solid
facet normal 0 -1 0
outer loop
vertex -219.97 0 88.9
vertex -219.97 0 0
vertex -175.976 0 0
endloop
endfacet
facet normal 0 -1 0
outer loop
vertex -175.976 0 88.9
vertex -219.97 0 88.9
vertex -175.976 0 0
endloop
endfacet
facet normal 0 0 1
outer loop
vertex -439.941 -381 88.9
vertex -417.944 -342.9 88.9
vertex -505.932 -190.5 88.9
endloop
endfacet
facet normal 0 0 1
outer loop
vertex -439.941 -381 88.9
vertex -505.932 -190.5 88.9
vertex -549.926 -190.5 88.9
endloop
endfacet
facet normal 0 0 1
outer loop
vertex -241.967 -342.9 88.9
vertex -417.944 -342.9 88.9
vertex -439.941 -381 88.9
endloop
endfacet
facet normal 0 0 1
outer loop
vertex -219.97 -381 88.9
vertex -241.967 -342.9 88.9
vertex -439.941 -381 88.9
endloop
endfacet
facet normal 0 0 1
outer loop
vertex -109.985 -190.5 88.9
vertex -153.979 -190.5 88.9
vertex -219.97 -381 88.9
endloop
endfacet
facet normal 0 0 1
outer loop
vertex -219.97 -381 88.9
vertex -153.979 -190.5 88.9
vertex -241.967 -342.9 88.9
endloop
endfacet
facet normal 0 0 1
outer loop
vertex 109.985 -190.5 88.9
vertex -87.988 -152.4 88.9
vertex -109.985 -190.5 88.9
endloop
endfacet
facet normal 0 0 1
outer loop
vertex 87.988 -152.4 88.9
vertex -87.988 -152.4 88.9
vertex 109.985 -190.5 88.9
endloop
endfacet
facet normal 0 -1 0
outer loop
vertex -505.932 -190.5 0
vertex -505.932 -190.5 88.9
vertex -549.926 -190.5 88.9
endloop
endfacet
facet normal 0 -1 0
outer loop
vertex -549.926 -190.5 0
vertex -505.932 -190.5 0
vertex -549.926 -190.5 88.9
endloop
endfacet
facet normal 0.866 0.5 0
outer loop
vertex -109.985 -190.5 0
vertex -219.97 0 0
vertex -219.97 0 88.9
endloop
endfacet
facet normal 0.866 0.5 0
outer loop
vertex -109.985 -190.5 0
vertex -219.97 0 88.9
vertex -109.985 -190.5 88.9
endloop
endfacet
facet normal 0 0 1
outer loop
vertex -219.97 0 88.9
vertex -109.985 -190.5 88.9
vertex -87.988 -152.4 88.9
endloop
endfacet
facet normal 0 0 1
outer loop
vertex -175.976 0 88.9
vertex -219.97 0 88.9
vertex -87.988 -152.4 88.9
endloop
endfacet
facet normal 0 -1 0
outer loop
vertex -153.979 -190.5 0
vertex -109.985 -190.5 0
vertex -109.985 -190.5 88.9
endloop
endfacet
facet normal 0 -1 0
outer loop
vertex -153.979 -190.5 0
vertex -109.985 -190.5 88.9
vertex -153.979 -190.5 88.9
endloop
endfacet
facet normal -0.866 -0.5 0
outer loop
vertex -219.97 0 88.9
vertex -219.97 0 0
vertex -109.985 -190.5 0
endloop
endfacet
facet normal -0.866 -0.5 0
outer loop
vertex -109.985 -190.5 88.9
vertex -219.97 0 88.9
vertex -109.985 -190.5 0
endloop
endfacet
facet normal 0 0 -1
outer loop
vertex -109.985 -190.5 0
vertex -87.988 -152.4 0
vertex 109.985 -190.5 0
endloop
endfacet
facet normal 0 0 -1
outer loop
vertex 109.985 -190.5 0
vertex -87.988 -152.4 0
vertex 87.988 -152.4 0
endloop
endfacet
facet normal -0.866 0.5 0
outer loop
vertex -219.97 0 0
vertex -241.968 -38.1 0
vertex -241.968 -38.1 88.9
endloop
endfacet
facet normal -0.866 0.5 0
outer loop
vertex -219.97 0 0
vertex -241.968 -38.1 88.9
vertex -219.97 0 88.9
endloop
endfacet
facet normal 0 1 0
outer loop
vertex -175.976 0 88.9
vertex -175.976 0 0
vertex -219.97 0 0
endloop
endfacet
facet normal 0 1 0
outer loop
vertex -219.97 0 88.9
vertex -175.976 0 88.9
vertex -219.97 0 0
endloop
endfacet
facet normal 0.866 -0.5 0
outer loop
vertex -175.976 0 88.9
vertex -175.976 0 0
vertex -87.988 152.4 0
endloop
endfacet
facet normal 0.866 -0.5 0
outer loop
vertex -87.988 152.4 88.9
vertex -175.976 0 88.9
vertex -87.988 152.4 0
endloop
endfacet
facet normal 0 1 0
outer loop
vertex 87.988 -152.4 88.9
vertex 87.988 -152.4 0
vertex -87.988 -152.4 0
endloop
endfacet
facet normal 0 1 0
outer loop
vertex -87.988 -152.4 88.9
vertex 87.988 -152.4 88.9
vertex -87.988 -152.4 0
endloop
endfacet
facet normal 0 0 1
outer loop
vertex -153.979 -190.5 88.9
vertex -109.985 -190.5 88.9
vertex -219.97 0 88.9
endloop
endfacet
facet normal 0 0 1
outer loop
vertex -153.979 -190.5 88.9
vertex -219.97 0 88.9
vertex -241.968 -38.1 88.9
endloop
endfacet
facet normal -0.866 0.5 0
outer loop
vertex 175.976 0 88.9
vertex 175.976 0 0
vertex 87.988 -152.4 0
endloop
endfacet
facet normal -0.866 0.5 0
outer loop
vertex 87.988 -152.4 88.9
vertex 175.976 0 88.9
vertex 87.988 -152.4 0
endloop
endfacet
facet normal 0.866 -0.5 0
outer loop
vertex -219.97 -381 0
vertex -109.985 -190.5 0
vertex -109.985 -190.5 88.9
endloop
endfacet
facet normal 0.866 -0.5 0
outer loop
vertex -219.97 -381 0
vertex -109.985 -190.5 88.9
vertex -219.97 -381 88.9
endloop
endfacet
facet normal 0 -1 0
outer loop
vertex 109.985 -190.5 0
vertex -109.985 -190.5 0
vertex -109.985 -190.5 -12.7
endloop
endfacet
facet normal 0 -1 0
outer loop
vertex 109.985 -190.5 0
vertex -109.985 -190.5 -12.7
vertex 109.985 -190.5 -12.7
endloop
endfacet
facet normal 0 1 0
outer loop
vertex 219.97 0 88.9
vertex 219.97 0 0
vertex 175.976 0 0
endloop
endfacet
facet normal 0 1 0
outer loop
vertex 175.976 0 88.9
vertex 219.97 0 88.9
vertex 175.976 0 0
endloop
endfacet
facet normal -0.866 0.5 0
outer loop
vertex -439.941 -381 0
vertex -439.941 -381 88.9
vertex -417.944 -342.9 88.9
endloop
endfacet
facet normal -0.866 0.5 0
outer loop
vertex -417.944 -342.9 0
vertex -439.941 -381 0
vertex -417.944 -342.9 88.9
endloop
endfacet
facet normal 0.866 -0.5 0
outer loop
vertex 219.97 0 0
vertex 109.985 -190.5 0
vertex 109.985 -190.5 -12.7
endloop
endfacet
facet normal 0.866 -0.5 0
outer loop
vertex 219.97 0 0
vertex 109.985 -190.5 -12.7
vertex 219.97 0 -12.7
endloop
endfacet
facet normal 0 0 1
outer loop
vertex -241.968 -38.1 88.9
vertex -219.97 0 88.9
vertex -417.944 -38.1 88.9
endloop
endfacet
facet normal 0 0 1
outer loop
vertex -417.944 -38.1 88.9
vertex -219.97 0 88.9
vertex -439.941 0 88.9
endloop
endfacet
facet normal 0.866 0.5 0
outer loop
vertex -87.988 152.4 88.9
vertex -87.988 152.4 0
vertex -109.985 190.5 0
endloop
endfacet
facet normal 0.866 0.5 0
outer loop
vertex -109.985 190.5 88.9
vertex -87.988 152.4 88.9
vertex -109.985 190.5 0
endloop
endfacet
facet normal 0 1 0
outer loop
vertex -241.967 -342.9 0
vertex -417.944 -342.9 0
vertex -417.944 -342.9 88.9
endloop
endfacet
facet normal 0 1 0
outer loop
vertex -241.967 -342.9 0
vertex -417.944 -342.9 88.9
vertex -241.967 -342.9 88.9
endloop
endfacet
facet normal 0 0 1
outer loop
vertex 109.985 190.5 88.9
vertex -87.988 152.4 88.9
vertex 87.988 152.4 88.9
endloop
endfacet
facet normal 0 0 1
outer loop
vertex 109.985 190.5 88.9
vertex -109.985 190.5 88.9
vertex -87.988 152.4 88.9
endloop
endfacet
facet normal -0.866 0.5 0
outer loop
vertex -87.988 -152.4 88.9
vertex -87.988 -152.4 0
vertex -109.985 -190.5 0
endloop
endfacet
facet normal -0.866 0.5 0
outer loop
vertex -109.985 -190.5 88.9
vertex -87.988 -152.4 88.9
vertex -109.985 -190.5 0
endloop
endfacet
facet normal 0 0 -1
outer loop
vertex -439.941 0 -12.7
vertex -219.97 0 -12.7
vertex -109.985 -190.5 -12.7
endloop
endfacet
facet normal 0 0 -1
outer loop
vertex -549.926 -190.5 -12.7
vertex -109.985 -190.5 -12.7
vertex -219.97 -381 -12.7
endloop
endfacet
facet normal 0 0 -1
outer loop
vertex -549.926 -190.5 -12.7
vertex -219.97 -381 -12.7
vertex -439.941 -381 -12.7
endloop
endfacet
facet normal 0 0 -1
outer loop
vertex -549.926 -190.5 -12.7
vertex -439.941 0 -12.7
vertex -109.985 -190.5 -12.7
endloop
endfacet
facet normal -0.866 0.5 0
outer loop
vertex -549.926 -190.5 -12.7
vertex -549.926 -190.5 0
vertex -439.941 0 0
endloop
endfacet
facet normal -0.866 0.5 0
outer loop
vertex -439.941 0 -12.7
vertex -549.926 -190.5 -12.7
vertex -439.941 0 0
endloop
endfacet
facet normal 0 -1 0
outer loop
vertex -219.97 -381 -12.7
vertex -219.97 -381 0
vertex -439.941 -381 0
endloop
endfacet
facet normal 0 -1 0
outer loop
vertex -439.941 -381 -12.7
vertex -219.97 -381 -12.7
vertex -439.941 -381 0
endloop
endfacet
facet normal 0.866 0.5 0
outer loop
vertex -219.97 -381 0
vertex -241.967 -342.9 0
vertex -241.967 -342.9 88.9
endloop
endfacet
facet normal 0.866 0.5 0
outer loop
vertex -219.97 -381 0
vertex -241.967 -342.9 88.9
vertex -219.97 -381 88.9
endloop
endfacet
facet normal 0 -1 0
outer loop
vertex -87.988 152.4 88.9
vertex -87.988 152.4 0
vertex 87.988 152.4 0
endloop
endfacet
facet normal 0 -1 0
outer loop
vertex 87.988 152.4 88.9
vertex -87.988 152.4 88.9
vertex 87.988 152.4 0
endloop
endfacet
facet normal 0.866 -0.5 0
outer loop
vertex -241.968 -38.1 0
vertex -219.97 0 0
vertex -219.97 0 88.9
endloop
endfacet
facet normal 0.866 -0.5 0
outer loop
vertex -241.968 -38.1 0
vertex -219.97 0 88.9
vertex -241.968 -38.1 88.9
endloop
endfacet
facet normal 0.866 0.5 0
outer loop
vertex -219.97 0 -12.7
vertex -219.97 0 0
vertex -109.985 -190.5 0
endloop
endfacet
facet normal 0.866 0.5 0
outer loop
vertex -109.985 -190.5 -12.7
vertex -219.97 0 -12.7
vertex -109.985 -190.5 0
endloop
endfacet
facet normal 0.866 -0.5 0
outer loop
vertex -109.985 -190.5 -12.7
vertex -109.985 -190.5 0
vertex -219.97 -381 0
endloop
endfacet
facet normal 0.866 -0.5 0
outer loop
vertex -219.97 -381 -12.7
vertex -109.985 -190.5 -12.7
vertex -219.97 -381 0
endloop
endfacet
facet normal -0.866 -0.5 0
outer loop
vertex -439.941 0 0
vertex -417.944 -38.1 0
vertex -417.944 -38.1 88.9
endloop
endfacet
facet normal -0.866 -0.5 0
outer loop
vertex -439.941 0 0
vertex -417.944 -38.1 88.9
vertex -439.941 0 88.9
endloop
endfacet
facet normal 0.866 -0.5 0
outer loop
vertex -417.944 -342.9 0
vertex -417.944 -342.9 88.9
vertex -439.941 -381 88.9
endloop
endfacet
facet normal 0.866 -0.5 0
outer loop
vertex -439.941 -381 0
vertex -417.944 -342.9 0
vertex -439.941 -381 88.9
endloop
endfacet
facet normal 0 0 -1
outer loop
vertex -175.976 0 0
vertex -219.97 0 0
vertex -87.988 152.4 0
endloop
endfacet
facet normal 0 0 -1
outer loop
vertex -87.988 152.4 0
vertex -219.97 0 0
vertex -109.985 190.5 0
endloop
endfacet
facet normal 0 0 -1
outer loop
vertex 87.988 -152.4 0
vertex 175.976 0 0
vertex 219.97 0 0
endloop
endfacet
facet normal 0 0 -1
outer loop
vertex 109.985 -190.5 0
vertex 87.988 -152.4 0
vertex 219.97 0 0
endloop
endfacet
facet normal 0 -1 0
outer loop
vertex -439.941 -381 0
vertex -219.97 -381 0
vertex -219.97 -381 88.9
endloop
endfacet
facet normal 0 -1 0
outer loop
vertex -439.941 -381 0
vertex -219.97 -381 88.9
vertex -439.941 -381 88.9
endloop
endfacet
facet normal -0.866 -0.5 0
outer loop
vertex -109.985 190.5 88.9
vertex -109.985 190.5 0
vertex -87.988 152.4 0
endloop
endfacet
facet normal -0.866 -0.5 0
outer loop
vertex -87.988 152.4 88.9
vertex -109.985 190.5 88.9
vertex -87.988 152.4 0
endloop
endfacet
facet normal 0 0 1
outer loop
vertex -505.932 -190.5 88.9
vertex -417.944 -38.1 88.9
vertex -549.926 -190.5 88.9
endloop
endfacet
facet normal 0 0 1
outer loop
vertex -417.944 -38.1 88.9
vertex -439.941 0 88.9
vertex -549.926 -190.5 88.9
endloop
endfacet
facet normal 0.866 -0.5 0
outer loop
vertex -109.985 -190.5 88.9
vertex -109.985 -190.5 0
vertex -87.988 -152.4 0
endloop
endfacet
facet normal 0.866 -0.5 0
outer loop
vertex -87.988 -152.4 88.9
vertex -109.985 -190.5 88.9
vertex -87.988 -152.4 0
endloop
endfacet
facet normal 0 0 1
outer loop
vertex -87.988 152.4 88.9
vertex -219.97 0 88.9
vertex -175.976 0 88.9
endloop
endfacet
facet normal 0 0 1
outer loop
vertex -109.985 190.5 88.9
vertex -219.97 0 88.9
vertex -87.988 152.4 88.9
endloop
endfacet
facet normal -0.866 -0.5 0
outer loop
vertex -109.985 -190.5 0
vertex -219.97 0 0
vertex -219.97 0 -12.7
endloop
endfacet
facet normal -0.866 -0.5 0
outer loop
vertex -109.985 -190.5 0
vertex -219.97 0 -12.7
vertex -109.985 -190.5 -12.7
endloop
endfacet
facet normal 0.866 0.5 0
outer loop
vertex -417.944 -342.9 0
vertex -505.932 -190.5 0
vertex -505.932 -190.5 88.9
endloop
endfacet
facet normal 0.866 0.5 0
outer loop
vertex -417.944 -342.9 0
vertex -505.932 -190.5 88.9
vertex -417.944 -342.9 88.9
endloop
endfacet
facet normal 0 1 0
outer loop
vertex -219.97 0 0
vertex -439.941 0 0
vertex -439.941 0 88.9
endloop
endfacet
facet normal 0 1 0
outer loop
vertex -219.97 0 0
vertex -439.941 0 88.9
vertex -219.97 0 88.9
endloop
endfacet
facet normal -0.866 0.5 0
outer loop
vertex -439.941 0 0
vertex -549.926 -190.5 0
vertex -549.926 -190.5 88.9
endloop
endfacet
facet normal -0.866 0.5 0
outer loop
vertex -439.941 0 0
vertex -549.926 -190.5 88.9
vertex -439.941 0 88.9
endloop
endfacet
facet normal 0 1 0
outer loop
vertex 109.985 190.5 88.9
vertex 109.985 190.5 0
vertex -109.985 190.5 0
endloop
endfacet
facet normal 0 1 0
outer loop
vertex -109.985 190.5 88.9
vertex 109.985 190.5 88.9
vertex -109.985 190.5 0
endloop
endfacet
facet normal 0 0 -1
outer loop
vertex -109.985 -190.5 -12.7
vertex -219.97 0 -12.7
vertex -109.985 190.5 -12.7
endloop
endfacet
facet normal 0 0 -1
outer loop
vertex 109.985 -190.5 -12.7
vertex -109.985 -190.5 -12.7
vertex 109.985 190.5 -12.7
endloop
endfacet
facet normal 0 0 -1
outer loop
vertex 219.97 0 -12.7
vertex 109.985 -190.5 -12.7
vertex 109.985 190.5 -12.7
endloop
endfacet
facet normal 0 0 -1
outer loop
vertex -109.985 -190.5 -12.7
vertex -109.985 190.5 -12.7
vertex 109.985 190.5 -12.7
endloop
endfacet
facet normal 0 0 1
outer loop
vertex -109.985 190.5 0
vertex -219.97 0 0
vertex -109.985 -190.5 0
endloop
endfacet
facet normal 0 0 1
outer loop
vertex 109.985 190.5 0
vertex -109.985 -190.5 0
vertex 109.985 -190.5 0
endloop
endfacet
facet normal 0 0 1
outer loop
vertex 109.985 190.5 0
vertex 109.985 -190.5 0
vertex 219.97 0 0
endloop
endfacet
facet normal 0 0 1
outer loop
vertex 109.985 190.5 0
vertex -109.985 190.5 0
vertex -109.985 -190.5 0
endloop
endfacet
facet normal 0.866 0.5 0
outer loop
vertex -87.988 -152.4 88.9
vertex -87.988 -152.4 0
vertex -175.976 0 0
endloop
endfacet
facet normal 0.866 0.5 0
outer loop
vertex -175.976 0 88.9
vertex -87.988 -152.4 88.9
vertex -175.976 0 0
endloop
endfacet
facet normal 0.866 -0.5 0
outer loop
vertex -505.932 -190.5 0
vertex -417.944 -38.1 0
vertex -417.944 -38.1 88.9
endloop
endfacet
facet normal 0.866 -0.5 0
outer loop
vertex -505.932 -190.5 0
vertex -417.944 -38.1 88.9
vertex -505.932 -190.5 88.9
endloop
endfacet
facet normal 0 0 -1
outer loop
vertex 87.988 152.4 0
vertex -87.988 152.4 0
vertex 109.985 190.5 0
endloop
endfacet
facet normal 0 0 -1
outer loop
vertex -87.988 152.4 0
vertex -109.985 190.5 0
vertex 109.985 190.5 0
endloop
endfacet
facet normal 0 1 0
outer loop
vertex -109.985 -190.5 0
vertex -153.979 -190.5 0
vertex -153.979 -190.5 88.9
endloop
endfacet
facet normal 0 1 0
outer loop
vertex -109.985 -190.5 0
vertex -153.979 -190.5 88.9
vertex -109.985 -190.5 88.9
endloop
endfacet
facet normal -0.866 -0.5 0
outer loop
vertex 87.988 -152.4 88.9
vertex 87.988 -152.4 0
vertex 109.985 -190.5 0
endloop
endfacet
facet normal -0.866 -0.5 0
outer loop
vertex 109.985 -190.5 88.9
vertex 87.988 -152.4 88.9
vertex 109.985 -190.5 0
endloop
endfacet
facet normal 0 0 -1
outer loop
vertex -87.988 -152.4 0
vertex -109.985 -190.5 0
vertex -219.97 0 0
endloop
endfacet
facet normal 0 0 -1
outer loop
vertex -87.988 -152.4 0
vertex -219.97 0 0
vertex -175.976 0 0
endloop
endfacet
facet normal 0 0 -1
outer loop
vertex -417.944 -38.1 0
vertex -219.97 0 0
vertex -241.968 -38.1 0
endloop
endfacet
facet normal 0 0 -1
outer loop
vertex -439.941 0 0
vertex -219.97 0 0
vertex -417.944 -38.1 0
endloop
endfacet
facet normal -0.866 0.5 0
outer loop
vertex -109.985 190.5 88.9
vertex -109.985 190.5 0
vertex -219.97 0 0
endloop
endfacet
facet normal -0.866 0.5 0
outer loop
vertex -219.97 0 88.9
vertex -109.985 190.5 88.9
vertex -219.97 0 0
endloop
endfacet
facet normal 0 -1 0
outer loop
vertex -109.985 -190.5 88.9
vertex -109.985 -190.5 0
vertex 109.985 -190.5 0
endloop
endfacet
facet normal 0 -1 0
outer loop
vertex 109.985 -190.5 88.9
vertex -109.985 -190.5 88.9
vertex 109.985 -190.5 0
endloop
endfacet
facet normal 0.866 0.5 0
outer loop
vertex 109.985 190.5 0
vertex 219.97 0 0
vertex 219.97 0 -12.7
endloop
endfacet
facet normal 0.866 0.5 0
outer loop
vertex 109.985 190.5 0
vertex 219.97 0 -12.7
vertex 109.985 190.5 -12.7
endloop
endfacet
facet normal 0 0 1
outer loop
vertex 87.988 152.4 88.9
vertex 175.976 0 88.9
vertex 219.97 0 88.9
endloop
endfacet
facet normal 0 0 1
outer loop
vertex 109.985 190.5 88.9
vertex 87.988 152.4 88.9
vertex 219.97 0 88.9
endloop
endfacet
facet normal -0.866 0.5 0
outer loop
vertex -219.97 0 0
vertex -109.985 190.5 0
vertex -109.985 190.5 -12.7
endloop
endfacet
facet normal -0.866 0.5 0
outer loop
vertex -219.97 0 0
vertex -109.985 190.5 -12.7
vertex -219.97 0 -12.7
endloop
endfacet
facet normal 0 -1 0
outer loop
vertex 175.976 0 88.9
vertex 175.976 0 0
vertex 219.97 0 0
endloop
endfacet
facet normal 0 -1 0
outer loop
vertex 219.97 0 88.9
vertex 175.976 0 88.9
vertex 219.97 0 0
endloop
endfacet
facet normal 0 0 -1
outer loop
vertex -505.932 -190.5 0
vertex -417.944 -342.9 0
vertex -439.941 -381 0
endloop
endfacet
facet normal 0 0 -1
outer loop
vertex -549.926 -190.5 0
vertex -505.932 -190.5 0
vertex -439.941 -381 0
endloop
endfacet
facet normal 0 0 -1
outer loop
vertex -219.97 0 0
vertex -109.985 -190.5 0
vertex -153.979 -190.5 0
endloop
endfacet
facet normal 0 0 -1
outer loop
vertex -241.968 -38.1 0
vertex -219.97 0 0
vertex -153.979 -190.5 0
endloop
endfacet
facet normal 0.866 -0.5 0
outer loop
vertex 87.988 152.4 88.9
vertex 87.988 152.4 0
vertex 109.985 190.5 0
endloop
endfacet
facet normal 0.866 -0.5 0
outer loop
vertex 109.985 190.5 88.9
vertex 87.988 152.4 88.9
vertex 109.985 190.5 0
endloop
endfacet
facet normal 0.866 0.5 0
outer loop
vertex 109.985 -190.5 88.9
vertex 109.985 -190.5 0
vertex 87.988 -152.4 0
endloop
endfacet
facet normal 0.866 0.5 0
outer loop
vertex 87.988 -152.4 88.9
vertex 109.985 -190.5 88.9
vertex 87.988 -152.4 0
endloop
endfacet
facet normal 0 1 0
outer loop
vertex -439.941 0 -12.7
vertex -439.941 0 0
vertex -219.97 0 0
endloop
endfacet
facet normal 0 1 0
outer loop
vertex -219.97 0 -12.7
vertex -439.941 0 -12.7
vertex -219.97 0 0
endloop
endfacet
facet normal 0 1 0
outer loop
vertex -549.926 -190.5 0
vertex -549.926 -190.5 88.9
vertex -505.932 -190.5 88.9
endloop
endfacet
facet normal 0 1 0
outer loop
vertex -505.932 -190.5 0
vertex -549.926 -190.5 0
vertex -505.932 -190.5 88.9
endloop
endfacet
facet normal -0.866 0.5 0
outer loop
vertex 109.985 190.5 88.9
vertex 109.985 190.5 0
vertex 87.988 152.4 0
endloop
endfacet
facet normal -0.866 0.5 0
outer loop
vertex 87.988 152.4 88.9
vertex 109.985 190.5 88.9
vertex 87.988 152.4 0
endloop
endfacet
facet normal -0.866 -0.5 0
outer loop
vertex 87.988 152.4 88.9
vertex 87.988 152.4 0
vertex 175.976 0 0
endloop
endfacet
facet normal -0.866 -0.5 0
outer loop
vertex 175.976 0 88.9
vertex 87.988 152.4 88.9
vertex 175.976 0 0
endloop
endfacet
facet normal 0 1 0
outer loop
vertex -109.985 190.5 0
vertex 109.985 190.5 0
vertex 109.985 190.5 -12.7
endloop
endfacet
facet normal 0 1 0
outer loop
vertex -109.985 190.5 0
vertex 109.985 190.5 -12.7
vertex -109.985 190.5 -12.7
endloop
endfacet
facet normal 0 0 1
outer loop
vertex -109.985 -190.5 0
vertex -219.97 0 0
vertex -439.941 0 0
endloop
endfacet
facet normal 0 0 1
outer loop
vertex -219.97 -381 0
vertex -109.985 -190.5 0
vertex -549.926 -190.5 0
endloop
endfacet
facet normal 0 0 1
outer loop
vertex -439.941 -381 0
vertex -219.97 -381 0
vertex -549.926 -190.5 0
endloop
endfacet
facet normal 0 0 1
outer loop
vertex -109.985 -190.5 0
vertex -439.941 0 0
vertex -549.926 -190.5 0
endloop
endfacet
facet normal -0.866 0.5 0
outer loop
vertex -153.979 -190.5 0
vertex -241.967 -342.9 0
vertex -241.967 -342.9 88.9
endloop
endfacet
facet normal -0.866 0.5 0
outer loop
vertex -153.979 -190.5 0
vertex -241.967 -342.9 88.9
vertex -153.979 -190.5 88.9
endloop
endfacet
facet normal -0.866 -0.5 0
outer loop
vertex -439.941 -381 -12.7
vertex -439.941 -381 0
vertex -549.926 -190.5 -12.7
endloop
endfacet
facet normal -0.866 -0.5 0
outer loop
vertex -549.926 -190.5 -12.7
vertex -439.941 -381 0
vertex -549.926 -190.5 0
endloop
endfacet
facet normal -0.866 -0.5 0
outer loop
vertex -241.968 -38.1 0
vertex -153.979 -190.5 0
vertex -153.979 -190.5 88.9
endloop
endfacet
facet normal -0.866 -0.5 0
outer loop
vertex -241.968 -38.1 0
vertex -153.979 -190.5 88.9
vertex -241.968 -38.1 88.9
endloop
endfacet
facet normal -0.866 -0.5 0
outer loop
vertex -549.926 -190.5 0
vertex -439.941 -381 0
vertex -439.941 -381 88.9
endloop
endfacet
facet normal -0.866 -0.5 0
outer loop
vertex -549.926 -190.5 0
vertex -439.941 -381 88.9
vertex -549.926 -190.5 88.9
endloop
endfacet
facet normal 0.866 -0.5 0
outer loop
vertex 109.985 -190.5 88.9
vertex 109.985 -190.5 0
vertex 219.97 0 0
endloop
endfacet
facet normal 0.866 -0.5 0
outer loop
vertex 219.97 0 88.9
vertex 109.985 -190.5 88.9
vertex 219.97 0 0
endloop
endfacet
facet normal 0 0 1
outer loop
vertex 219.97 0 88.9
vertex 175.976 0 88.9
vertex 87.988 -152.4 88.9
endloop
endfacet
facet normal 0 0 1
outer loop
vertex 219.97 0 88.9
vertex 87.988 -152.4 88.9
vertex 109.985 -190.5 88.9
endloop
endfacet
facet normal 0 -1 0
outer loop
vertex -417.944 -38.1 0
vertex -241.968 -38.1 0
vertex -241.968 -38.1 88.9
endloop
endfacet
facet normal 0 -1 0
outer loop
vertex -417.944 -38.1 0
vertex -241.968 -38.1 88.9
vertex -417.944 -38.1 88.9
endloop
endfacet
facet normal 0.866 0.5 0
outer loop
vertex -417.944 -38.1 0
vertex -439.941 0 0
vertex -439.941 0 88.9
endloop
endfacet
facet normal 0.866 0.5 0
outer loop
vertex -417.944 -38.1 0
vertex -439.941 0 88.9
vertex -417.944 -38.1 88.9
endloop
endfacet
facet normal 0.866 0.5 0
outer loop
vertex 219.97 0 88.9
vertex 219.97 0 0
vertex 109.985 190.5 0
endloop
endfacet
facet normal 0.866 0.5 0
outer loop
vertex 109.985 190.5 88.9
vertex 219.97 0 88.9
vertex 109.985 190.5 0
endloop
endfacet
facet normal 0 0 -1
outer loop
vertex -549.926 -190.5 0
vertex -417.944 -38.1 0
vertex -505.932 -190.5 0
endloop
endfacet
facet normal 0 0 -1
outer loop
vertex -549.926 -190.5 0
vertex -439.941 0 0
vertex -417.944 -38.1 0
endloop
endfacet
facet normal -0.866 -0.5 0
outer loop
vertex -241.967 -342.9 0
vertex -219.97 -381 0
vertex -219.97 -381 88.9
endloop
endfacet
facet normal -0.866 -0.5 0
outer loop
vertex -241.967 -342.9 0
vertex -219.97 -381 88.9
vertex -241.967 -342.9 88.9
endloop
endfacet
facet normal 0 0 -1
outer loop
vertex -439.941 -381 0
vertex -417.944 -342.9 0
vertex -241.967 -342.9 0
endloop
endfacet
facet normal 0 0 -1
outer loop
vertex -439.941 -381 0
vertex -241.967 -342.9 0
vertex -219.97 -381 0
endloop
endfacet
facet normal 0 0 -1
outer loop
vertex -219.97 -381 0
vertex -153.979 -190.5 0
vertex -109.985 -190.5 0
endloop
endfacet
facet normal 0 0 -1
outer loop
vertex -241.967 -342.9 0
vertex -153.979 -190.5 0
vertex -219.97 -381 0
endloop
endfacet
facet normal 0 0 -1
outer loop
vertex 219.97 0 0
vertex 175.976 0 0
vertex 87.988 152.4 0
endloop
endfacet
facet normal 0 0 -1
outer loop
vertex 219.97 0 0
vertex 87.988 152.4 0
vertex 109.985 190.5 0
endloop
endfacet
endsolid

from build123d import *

# Parameters (mm, degrees)
F1_DEPTH = 88.9
F2_DEPTH = 88.9
F3_DEPTH = 12.7


with BuildPart() as f1:
    # F0 (on Top) → F1 (new body)
    with BuildSketch(Plane.XY):
        Polygon((-175.976362, 0), (-87.988181, 152.4), (-109.985226, 190.5), (-219.970453, 0), align=None)
        Polygon((87.988181, 152.4), (175.976362, 0), (219.970453, 0), (109.985226, 190.5), align=None)
        Polygon((109.985226, -190.5), (87.988181, -152.4), (-87.988181, -152.4), (-109.985226, -190.5), align=None)
    extrude(amount=F1_DEPTH)


with BuildPart() as f2:
    # F0 (on Top) → F2 (new body)
    with BuildSketch(Plane.XY):
        Polygon((-87.988181, 152.4), (87.988181, 152.4), (109.985226, 190.5), (-109.985226, 190.5), align=None)
        Polygon((-109.985226, -190.5), (-87.988181, -152.4), (-175.976362, 0), (-219.970453, 0), align=None)
        Polygon((219.970453, 0), (175.976362, 0), (87.988181, -152.4), (109.985226, -190.5), align=None)
    extrude(amount=F2_DEPTH)


with BuildPart() as f3:
    # F0 (on Top) → F3 (new body)
    with BuildSketch(Plane.XY):
        Polygon((-109.985226, -190.5), (-87.988181, -152.4), (-175.976362, 0), (-219.970453, 0), align=None)
        Polygon((-175.976362, 0), (-87.988181, 152.4), (-109.985226, 190.5), (-219.970453, 0), align=None)
        Polygon((109.985226, -190.5), (87.988181, -152.4), (-87.988181, -152.4), (-109.985226, -190.5), align=None)
        Polygon((-87.988181, 152.4), (87.988181, 152.4), (109.985226, 190.5), (-109.985226, 190.5), align=None)
        Polygon((87.988181, 152.4), (175.976362, 0), (219.970453, 0), (109.985226, 190.5), align=None)
        Polygon((87.988181, -152.4), (175.976362, 0), (87.988181, 152.4), (-87.988181, 152.4), (-175.976362, 0), (-87.988181, -152.4), align=None)
        Polygon((219.970453, 0), (175.976362, 0), (87.988181, -152.4), (109.985226, -190.5), align=None)
    extrude(amount=-F3_DEPTH)


with BuildPart() as f4_1:
    # F4: instance of F2
    add(f2.part.mirror(Plane(origin=(-164.977839, -95.25, 44.45), x_dir=(0.5, -0.866025, 0), z_dir=(-0.866025, -0.5, 0))))


with BuildPart() as f4_2:
    # F4: instance of F1
    add(f1.part.mirror(Plane(origin=(-164.977839, -95.25, 44.45), x_dir=(0.5, -0.866025, 0), z_dir=(-0.866025, -0.5, 0))))


with BuildPart() as f4_3:
    # F4: instance of F3
    add(f3.part.mirror(Plane(origin=(-164.977839, -95.25, 44.45), x_dir=(0.5, -0.866025, 0), z_dir=(-0.866025, -0.5, 0))))


solid = Compound([f1.part, f2.part, f3.part, f4_1.part, f4_2.part, f4_3.part])
